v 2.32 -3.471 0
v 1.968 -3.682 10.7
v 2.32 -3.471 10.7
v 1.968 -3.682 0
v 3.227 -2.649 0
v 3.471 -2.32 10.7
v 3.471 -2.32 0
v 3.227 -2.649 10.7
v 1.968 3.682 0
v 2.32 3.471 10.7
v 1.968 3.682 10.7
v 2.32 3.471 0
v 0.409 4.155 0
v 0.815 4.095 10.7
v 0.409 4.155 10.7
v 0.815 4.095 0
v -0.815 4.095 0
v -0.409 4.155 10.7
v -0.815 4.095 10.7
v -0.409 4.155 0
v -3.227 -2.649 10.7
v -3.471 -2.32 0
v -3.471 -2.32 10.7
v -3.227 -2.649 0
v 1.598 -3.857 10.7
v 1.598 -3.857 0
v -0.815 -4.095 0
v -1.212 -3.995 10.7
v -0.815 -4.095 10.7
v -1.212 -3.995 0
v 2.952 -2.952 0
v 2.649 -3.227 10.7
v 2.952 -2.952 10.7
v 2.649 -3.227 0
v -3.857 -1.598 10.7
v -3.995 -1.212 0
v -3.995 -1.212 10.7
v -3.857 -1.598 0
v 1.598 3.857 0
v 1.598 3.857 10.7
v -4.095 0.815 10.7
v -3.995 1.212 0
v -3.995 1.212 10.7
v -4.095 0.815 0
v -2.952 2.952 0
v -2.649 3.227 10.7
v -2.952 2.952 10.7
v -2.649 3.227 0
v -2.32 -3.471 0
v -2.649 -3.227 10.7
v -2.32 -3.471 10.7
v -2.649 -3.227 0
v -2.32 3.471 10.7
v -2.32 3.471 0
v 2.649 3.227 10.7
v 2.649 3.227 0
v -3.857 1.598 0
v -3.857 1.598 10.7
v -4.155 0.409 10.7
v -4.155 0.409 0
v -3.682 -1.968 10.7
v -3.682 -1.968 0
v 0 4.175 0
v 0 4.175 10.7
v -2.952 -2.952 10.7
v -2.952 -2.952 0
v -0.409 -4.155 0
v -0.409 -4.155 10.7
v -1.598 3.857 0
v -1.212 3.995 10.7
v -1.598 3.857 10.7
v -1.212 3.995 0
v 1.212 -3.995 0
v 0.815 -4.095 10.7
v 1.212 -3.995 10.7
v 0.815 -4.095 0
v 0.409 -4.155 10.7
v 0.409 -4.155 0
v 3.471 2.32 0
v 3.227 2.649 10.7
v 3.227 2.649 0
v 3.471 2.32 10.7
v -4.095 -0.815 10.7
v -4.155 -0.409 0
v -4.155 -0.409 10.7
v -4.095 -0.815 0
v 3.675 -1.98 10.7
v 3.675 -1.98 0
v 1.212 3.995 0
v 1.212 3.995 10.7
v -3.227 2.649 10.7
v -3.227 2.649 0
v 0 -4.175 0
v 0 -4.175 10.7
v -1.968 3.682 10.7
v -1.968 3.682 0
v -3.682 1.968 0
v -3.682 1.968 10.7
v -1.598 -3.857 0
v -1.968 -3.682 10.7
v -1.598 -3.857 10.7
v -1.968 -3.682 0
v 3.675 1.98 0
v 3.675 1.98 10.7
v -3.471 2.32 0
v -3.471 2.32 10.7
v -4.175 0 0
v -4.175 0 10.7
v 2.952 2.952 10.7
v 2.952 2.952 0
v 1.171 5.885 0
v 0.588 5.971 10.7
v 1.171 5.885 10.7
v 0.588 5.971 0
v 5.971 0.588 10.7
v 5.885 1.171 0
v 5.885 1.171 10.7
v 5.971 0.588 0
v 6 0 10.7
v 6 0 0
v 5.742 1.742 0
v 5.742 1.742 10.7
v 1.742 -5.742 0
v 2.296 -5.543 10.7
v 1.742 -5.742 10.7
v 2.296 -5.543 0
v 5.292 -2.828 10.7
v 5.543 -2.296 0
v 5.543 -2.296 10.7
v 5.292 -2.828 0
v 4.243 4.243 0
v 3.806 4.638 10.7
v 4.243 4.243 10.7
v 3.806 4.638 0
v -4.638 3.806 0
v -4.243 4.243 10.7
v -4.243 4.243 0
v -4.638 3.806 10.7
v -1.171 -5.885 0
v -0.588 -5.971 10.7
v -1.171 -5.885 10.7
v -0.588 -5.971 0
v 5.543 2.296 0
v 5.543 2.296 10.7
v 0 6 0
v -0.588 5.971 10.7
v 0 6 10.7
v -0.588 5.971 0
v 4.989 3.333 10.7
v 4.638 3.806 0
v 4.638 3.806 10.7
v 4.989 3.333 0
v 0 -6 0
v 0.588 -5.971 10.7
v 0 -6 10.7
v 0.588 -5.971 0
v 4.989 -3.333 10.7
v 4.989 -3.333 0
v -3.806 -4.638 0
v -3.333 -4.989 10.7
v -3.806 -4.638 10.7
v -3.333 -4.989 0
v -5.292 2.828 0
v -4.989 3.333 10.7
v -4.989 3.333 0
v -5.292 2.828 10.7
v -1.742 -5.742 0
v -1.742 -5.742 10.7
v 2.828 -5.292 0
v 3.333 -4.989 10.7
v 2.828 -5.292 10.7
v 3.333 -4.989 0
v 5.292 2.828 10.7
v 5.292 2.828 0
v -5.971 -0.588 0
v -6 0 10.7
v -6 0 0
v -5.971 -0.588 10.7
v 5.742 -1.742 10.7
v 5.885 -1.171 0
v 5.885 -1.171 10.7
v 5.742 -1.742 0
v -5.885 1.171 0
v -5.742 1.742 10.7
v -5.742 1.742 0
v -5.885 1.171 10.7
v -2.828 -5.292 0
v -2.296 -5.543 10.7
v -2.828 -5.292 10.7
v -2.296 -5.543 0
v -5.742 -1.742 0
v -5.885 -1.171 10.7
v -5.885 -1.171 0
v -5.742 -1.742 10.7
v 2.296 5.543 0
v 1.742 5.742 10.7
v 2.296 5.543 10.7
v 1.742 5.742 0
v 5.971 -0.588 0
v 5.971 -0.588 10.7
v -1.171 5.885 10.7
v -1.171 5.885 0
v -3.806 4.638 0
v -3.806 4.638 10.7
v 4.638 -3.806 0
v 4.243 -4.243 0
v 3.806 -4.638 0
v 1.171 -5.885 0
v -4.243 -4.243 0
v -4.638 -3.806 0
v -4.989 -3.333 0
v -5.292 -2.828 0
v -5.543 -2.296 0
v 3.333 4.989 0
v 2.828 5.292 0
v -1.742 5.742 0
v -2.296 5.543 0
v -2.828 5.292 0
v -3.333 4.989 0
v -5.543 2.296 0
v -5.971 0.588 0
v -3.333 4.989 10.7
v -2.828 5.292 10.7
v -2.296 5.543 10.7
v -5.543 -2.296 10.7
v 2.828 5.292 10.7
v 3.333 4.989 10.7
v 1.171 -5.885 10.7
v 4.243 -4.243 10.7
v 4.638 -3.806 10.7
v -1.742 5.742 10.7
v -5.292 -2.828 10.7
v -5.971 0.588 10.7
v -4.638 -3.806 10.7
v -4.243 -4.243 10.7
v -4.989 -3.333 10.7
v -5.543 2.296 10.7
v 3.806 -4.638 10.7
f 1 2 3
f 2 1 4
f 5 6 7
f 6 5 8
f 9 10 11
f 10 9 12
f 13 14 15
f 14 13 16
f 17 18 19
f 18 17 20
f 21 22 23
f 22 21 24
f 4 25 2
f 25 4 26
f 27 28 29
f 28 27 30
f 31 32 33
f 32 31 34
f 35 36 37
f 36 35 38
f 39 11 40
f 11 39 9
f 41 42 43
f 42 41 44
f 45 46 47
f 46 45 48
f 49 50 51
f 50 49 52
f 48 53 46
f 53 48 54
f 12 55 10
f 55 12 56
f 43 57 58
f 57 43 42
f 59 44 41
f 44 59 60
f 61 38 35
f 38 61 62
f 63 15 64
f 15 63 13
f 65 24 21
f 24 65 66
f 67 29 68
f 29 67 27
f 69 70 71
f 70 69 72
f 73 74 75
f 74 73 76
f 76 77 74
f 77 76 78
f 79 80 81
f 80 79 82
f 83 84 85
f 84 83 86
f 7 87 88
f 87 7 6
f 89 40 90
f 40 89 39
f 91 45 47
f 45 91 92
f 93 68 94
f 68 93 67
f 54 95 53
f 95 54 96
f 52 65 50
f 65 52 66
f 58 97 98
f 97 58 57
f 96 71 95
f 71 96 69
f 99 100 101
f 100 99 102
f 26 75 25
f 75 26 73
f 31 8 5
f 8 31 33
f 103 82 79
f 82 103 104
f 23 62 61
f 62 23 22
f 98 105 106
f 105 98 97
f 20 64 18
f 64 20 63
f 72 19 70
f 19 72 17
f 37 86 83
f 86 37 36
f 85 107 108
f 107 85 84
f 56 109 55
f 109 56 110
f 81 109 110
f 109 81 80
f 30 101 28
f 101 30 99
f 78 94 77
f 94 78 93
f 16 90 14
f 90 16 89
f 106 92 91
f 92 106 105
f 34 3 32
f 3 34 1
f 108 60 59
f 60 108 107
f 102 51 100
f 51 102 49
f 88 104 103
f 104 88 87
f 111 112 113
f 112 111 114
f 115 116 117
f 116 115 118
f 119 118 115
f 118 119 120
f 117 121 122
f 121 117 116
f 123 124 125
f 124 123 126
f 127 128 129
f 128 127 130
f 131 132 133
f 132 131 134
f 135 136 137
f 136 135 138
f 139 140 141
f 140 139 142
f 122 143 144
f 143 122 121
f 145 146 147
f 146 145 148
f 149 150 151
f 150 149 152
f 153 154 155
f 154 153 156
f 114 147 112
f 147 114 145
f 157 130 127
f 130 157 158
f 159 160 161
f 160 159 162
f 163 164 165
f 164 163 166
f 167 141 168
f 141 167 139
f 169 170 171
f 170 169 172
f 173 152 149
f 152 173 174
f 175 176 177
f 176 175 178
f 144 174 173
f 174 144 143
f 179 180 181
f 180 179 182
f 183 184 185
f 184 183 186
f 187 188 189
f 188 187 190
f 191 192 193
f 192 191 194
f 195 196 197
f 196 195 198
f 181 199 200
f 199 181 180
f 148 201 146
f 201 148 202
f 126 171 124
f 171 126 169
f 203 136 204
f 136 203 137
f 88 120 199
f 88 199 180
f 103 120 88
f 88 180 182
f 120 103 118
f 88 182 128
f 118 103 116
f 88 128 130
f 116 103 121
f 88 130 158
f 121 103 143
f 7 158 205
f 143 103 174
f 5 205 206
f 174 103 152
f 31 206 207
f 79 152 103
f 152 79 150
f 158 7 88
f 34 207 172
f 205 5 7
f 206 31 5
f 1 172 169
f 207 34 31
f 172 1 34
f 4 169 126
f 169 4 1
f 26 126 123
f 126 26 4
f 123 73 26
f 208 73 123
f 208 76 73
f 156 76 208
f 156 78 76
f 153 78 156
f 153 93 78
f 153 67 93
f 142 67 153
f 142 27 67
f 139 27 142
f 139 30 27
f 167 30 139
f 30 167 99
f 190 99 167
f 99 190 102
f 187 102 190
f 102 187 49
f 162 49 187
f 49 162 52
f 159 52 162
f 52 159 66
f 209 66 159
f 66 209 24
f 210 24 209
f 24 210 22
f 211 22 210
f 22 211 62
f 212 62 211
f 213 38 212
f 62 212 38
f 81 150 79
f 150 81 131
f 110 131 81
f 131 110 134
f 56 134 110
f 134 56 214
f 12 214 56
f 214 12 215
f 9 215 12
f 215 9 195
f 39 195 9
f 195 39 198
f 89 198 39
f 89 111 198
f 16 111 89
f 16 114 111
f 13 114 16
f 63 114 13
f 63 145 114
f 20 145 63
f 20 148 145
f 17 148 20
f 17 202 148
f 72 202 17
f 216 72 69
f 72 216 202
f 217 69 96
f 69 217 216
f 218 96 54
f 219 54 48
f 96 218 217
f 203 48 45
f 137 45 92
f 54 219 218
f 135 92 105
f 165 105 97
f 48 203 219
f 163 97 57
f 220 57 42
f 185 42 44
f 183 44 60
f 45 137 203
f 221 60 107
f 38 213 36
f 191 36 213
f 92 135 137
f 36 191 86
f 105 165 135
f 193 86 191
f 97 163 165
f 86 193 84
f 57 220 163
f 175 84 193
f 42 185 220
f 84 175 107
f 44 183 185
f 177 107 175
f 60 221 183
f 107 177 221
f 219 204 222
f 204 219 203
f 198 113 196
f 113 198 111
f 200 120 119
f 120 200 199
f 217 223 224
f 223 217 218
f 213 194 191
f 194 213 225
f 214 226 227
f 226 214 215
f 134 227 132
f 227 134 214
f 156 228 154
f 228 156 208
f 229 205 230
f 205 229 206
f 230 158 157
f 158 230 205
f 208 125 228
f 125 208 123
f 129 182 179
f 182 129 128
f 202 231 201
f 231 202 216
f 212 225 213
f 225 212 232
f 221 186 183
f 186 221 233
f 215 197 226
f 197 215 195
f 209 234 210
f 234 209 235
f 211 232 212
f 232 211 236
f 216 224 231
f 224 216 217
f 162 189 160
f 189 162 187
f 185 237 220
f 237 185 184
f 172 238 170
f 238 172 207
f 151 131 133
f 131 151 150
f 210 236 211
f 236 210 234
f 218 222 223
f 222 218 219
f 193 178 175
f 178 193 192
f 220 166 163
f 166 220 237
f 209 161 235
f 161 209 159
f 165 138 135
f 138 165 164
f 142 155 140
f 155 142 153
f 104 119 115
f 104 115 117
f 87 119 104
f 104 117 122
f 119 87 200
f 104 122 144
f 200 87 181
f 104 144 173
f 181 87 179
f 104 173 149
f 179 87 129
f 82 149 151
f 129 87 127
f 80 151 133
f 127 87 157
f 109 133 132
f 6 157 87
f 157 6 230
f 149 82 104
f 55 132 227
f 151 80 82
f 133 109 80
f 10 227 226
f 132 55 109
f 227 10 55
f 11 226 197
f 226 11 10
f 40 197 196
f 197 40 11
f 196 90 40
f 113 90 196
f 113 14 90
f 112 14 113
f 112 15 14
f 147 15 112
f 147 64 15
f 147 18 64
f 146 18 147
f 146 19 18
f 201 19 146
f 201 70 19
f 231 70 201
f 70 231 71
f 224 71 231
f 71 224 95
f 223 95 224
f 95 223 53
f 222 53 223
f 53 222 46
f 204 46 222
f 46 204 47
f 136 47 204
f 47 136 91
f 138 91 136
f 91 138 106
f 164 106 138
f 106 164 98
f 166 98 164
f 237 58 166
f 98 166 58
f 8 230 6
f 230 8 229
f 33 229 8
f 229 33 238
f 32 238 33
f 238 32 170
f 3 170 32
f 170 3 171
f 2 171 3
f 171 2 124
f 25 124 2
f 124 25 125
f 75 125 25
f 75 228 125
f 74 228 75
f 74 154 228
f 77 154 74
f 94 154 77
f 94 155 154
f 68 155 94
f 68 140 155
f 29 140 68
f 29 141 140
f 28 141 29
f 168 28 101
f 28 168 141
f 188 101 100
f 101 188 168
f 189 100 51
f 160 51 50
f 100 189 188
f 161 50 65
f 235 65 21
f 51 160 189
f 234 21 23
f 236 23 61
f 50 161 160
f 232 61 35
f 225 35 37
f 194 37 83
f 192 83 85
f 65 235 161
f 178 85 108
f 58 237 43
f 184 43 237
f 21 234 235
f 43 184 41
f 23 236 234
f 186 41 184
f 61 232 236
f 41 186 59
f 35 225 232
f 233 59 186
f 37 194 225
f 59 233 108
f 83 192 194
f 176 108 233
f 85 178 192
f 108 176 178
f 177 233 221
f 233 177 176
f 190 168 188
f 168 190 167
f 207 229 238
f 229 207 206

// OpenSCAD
// file: parameters.scad
// =============================================================================
// Gen-BP — nightly 2026-10-07 (physics_scorer, honest magpylib watts)
// Cheapest upgrade of the champion: keep Gen-BL's wound bobbins, stator, gap sleeve, endbells and Ø134 steel, and print only two new rotor carriers — 5.00 mm thick (flush magnet seat, recess 0 instead of 0.10 mm, magnet→wound envelope still 0.50 mm) with the diametric Ø5 assists moved from R40/50/60 to R43/50/57. Modular: the rotor is the only swapped module.
// Clocking 0 deg (magnets N facing S) + D-flat keyed bore + index notch + flip-symmetric hole map.
// Windable 2-piece bobbin; turns = physics_scorer turns_fit; copper only between flanges.
// Steel back-iron: 2× Ø134 × 4.76 mm (3/16") mild-steel discs (steel_backiron_disc.dxf); magnets sit ON the steel
// (through-pockets) -> score with --back-iron.
// =============================================================================
topology            = "dual_rotor";

// --- Wire / winding (physics_scorer winding-fit) -------------------------------
wire_awg            = 26;
wire_od             = 0.45;     // insulated OD mm (bare 0.405)
fill_realistic      = 0.65;     // insulated-wire area / window (DENSE layered wind with a jig; scorer cap 0.65)
turns               = 566;       // = physics_scorer turns_fit (do NOT raise)
coil_former_type    = "bobbin";
coil_core_inset     = 17.10;     // radial copper build: hub = copper boundary inset by this
wind_build_axial    = 0.0;      // nothing proud of the flanges
wind_build_radial   = 0.0;

// --- Bobbin (base + lid) ---------------------------------------------------------
coil_id_r           = 29.00;    // copper boundary sector
coil_od_r           = 71.00;
span_deg            = 52.68;    // = pitch - 2*asin((wall+0.85)/coil_id_r) -> >=1.2 mm stator web
former_web          = 8.10;     // copper height between flanges (TALL copper: steel keeps Bz up)
flange_t            = 0.80;     // >= 0.8 mm FDM wall rule (tall winds push on the flanges)
wall                = 1.00;     // flange lip beyond copper
former_bare_h       = former_web + 2 * flange_t;
coil_envelope_h     = former_bare_h + 2 * wind_build_axial;
tab_w               = 7.0;
tab_len             = 7.0;
tab_h               = former_bare_h / 2;
pin_d               = 1.9;      // 1.75 mm filament locating pin
coil_mount_r        = coil_od_r + 0.2 + 4.0;
lead_y              = 1.6;
lead_slot_w         = 0.9;
lead_groove_d       = 0.6;

// --- Gap -------------------------------------------------------------------------
run_clear           = 0.50;     // rotor face -> flange
gap_spacer_h        = run_clear + wind_build_axial;
m2m                 = coil_envelope_h + 2 * run_clear;   // rotor face to rotor face (= gap_sleeve length)

// --- Stator ----------------------------------------------------------------------
coil_stations       = 6;
bay_clear           = 0.25;
stator_thick        = former_bare_h;                        // bobbins flush both faces
stator_od           = 160;
shaft_clear_stator  = 14.0;     // stator is static; gap sleeve OD 12 spins inside

// --- Rotor(s) --------------------------------------------------------------------
magnet_Br           = 1.43;     // N52
magnet_d_large      = 20.0;
magnet_h_large      = 5.0;      // one O20x5 per pocket
magnet_h_small      = 5.0;      // one O5x5 per pocket
halbach_magnetisation = "diametric"; // O5x5 assist magnets MUST be DIAMETRICALLY magnetised (tangential)
rotor_b_same_axis   = true;     // same-index magnets share one axis: N faces S across the gap
large_pocket_d      = 20.3;
small_pocket_d      = 5.3;
pocket_h            = 5.00;     // THROUGH the carrier: magnet back face sits on the steel disc (FLUSH seat: carrier = magnet height, magnet face level with the rotor face)
large_n             = 8;
R_large             = 50.0;
R_small_inner       = 43.0;
R_small_mid         = 50.0;
R_small_outer       = 57.0;
small_r_list        = [R_small_inner, R_small_mid, R_small_outer];   // O5 pockets between poles
carrier_od          = 134.0;
carrier_thick       = pocket_h;
hub_h               = 12.0;     // > steel_t + insert: radial set-screw clears the steel
hub_od              = 24.0;     // slim hub so the M4 brace rods fit at R~18 inside the coil ring
hub_insert_d        = 4.0;      // M3 heat-set insert, radial, bears on the D-flat
rotor_b_offset_deg  = 0.0;      // CLOCKING: magnets directly opposite
shaft_key           = "dflat";
dflat_depth         = 0.5;      // 8 mm shaft with 0.5 mm flat (7.5 across flat)
index_notch_d       = 3.0;

// --- Steel back-iron (buyable laser-cut) -------------------------------------------
steel_t             = 4.76;      // mild steel thickness (image method ignores it; sized from steel_flux.py so the return path stays well below saturation)
steel_center_hole   = 26.0;     // slips over the rotor hub (OD 24)
steel_od            = carrier_od;   // steel disc OD = rotor carrier OD

// --- Modular MAX interface ----------------------------------------------------------
shaft_bore          = 8.35;
dflat_x             = 4.0 - dflat_depth + (shaft_bore - 8.0) / 2;
bearing_d           = 21.85;
bearing_h           = 7.2;
m3_clear            = 3.5;
bolt_r_inner        = 30.0;     // M3 steel-disc clamp bolts (inside the magnet ring)
bolt_n_inner        = 4;
bolt_inner_angles   = [0, 90, 180, 270];
bolt_r_outer        = 63.0;     // M3 steel-disc clamp bolts (outside the magnet ring)
bolt_outer_angles   = [45, 135, 225, 315];
flange_bolt_r       = 73.0;     // frame rods: OUTSIDE the rotor OD (rotors spin inside them)
flange_bolt_n       = 6;
flange_bolt_offset  = 30.00;    // between coil stations -> never cuts a lead groove/tab
brace_r             = 18.0;
brace_d             = 4.3;      // temporary M4 jack rods (assembly only)
brace_n             = 4;
brace_angles        = [45, 135, 225, 315];          // flip-symmetric

spacer_pad_od       = 14.0;
spacer_pad_id       = m3_clear;
endbell_od          = 160;
endbell_thick       = 8.0;
endbell_shaft_clear = 10.0;
collar_h            = 10.0;
standoff_od         = 9.0;
frame_standoff_h    = run_clear + carrier_thick + hub_h + collar_h + 2.0;
sleeve_od           = 12.0;
plate_max_mm        = 410;

$fn = 64;
// main file
// Gen-BP — gap sleeve: rigid spacer on the shaft BETWEEN the two rotor carriers (passes through the stator
// hole). Length = m2m, so it sets the magnet gap and carries the full magnet pull. Print x1, upright.
include <parameters.scad>;
$fn = 64;
// D-flat keyed bore: flat faces +X (angle 0 = magnet pocket 0 = index notch)
module dflat_bore(h) {
    intersection() {
        cylinder(d=shaft_bore, h=h);
        translate([-shaft_bore, -shaft_bore, 0]) cube([shaft_bore + dflat_x, 2*shaft_bore, h]);
    }
}

difference() {
    cylinder(d=sleeve_od, h=m2m);
    translate([0, 0, -0.1]) dflat_bore(m2m + 0.2);
}
